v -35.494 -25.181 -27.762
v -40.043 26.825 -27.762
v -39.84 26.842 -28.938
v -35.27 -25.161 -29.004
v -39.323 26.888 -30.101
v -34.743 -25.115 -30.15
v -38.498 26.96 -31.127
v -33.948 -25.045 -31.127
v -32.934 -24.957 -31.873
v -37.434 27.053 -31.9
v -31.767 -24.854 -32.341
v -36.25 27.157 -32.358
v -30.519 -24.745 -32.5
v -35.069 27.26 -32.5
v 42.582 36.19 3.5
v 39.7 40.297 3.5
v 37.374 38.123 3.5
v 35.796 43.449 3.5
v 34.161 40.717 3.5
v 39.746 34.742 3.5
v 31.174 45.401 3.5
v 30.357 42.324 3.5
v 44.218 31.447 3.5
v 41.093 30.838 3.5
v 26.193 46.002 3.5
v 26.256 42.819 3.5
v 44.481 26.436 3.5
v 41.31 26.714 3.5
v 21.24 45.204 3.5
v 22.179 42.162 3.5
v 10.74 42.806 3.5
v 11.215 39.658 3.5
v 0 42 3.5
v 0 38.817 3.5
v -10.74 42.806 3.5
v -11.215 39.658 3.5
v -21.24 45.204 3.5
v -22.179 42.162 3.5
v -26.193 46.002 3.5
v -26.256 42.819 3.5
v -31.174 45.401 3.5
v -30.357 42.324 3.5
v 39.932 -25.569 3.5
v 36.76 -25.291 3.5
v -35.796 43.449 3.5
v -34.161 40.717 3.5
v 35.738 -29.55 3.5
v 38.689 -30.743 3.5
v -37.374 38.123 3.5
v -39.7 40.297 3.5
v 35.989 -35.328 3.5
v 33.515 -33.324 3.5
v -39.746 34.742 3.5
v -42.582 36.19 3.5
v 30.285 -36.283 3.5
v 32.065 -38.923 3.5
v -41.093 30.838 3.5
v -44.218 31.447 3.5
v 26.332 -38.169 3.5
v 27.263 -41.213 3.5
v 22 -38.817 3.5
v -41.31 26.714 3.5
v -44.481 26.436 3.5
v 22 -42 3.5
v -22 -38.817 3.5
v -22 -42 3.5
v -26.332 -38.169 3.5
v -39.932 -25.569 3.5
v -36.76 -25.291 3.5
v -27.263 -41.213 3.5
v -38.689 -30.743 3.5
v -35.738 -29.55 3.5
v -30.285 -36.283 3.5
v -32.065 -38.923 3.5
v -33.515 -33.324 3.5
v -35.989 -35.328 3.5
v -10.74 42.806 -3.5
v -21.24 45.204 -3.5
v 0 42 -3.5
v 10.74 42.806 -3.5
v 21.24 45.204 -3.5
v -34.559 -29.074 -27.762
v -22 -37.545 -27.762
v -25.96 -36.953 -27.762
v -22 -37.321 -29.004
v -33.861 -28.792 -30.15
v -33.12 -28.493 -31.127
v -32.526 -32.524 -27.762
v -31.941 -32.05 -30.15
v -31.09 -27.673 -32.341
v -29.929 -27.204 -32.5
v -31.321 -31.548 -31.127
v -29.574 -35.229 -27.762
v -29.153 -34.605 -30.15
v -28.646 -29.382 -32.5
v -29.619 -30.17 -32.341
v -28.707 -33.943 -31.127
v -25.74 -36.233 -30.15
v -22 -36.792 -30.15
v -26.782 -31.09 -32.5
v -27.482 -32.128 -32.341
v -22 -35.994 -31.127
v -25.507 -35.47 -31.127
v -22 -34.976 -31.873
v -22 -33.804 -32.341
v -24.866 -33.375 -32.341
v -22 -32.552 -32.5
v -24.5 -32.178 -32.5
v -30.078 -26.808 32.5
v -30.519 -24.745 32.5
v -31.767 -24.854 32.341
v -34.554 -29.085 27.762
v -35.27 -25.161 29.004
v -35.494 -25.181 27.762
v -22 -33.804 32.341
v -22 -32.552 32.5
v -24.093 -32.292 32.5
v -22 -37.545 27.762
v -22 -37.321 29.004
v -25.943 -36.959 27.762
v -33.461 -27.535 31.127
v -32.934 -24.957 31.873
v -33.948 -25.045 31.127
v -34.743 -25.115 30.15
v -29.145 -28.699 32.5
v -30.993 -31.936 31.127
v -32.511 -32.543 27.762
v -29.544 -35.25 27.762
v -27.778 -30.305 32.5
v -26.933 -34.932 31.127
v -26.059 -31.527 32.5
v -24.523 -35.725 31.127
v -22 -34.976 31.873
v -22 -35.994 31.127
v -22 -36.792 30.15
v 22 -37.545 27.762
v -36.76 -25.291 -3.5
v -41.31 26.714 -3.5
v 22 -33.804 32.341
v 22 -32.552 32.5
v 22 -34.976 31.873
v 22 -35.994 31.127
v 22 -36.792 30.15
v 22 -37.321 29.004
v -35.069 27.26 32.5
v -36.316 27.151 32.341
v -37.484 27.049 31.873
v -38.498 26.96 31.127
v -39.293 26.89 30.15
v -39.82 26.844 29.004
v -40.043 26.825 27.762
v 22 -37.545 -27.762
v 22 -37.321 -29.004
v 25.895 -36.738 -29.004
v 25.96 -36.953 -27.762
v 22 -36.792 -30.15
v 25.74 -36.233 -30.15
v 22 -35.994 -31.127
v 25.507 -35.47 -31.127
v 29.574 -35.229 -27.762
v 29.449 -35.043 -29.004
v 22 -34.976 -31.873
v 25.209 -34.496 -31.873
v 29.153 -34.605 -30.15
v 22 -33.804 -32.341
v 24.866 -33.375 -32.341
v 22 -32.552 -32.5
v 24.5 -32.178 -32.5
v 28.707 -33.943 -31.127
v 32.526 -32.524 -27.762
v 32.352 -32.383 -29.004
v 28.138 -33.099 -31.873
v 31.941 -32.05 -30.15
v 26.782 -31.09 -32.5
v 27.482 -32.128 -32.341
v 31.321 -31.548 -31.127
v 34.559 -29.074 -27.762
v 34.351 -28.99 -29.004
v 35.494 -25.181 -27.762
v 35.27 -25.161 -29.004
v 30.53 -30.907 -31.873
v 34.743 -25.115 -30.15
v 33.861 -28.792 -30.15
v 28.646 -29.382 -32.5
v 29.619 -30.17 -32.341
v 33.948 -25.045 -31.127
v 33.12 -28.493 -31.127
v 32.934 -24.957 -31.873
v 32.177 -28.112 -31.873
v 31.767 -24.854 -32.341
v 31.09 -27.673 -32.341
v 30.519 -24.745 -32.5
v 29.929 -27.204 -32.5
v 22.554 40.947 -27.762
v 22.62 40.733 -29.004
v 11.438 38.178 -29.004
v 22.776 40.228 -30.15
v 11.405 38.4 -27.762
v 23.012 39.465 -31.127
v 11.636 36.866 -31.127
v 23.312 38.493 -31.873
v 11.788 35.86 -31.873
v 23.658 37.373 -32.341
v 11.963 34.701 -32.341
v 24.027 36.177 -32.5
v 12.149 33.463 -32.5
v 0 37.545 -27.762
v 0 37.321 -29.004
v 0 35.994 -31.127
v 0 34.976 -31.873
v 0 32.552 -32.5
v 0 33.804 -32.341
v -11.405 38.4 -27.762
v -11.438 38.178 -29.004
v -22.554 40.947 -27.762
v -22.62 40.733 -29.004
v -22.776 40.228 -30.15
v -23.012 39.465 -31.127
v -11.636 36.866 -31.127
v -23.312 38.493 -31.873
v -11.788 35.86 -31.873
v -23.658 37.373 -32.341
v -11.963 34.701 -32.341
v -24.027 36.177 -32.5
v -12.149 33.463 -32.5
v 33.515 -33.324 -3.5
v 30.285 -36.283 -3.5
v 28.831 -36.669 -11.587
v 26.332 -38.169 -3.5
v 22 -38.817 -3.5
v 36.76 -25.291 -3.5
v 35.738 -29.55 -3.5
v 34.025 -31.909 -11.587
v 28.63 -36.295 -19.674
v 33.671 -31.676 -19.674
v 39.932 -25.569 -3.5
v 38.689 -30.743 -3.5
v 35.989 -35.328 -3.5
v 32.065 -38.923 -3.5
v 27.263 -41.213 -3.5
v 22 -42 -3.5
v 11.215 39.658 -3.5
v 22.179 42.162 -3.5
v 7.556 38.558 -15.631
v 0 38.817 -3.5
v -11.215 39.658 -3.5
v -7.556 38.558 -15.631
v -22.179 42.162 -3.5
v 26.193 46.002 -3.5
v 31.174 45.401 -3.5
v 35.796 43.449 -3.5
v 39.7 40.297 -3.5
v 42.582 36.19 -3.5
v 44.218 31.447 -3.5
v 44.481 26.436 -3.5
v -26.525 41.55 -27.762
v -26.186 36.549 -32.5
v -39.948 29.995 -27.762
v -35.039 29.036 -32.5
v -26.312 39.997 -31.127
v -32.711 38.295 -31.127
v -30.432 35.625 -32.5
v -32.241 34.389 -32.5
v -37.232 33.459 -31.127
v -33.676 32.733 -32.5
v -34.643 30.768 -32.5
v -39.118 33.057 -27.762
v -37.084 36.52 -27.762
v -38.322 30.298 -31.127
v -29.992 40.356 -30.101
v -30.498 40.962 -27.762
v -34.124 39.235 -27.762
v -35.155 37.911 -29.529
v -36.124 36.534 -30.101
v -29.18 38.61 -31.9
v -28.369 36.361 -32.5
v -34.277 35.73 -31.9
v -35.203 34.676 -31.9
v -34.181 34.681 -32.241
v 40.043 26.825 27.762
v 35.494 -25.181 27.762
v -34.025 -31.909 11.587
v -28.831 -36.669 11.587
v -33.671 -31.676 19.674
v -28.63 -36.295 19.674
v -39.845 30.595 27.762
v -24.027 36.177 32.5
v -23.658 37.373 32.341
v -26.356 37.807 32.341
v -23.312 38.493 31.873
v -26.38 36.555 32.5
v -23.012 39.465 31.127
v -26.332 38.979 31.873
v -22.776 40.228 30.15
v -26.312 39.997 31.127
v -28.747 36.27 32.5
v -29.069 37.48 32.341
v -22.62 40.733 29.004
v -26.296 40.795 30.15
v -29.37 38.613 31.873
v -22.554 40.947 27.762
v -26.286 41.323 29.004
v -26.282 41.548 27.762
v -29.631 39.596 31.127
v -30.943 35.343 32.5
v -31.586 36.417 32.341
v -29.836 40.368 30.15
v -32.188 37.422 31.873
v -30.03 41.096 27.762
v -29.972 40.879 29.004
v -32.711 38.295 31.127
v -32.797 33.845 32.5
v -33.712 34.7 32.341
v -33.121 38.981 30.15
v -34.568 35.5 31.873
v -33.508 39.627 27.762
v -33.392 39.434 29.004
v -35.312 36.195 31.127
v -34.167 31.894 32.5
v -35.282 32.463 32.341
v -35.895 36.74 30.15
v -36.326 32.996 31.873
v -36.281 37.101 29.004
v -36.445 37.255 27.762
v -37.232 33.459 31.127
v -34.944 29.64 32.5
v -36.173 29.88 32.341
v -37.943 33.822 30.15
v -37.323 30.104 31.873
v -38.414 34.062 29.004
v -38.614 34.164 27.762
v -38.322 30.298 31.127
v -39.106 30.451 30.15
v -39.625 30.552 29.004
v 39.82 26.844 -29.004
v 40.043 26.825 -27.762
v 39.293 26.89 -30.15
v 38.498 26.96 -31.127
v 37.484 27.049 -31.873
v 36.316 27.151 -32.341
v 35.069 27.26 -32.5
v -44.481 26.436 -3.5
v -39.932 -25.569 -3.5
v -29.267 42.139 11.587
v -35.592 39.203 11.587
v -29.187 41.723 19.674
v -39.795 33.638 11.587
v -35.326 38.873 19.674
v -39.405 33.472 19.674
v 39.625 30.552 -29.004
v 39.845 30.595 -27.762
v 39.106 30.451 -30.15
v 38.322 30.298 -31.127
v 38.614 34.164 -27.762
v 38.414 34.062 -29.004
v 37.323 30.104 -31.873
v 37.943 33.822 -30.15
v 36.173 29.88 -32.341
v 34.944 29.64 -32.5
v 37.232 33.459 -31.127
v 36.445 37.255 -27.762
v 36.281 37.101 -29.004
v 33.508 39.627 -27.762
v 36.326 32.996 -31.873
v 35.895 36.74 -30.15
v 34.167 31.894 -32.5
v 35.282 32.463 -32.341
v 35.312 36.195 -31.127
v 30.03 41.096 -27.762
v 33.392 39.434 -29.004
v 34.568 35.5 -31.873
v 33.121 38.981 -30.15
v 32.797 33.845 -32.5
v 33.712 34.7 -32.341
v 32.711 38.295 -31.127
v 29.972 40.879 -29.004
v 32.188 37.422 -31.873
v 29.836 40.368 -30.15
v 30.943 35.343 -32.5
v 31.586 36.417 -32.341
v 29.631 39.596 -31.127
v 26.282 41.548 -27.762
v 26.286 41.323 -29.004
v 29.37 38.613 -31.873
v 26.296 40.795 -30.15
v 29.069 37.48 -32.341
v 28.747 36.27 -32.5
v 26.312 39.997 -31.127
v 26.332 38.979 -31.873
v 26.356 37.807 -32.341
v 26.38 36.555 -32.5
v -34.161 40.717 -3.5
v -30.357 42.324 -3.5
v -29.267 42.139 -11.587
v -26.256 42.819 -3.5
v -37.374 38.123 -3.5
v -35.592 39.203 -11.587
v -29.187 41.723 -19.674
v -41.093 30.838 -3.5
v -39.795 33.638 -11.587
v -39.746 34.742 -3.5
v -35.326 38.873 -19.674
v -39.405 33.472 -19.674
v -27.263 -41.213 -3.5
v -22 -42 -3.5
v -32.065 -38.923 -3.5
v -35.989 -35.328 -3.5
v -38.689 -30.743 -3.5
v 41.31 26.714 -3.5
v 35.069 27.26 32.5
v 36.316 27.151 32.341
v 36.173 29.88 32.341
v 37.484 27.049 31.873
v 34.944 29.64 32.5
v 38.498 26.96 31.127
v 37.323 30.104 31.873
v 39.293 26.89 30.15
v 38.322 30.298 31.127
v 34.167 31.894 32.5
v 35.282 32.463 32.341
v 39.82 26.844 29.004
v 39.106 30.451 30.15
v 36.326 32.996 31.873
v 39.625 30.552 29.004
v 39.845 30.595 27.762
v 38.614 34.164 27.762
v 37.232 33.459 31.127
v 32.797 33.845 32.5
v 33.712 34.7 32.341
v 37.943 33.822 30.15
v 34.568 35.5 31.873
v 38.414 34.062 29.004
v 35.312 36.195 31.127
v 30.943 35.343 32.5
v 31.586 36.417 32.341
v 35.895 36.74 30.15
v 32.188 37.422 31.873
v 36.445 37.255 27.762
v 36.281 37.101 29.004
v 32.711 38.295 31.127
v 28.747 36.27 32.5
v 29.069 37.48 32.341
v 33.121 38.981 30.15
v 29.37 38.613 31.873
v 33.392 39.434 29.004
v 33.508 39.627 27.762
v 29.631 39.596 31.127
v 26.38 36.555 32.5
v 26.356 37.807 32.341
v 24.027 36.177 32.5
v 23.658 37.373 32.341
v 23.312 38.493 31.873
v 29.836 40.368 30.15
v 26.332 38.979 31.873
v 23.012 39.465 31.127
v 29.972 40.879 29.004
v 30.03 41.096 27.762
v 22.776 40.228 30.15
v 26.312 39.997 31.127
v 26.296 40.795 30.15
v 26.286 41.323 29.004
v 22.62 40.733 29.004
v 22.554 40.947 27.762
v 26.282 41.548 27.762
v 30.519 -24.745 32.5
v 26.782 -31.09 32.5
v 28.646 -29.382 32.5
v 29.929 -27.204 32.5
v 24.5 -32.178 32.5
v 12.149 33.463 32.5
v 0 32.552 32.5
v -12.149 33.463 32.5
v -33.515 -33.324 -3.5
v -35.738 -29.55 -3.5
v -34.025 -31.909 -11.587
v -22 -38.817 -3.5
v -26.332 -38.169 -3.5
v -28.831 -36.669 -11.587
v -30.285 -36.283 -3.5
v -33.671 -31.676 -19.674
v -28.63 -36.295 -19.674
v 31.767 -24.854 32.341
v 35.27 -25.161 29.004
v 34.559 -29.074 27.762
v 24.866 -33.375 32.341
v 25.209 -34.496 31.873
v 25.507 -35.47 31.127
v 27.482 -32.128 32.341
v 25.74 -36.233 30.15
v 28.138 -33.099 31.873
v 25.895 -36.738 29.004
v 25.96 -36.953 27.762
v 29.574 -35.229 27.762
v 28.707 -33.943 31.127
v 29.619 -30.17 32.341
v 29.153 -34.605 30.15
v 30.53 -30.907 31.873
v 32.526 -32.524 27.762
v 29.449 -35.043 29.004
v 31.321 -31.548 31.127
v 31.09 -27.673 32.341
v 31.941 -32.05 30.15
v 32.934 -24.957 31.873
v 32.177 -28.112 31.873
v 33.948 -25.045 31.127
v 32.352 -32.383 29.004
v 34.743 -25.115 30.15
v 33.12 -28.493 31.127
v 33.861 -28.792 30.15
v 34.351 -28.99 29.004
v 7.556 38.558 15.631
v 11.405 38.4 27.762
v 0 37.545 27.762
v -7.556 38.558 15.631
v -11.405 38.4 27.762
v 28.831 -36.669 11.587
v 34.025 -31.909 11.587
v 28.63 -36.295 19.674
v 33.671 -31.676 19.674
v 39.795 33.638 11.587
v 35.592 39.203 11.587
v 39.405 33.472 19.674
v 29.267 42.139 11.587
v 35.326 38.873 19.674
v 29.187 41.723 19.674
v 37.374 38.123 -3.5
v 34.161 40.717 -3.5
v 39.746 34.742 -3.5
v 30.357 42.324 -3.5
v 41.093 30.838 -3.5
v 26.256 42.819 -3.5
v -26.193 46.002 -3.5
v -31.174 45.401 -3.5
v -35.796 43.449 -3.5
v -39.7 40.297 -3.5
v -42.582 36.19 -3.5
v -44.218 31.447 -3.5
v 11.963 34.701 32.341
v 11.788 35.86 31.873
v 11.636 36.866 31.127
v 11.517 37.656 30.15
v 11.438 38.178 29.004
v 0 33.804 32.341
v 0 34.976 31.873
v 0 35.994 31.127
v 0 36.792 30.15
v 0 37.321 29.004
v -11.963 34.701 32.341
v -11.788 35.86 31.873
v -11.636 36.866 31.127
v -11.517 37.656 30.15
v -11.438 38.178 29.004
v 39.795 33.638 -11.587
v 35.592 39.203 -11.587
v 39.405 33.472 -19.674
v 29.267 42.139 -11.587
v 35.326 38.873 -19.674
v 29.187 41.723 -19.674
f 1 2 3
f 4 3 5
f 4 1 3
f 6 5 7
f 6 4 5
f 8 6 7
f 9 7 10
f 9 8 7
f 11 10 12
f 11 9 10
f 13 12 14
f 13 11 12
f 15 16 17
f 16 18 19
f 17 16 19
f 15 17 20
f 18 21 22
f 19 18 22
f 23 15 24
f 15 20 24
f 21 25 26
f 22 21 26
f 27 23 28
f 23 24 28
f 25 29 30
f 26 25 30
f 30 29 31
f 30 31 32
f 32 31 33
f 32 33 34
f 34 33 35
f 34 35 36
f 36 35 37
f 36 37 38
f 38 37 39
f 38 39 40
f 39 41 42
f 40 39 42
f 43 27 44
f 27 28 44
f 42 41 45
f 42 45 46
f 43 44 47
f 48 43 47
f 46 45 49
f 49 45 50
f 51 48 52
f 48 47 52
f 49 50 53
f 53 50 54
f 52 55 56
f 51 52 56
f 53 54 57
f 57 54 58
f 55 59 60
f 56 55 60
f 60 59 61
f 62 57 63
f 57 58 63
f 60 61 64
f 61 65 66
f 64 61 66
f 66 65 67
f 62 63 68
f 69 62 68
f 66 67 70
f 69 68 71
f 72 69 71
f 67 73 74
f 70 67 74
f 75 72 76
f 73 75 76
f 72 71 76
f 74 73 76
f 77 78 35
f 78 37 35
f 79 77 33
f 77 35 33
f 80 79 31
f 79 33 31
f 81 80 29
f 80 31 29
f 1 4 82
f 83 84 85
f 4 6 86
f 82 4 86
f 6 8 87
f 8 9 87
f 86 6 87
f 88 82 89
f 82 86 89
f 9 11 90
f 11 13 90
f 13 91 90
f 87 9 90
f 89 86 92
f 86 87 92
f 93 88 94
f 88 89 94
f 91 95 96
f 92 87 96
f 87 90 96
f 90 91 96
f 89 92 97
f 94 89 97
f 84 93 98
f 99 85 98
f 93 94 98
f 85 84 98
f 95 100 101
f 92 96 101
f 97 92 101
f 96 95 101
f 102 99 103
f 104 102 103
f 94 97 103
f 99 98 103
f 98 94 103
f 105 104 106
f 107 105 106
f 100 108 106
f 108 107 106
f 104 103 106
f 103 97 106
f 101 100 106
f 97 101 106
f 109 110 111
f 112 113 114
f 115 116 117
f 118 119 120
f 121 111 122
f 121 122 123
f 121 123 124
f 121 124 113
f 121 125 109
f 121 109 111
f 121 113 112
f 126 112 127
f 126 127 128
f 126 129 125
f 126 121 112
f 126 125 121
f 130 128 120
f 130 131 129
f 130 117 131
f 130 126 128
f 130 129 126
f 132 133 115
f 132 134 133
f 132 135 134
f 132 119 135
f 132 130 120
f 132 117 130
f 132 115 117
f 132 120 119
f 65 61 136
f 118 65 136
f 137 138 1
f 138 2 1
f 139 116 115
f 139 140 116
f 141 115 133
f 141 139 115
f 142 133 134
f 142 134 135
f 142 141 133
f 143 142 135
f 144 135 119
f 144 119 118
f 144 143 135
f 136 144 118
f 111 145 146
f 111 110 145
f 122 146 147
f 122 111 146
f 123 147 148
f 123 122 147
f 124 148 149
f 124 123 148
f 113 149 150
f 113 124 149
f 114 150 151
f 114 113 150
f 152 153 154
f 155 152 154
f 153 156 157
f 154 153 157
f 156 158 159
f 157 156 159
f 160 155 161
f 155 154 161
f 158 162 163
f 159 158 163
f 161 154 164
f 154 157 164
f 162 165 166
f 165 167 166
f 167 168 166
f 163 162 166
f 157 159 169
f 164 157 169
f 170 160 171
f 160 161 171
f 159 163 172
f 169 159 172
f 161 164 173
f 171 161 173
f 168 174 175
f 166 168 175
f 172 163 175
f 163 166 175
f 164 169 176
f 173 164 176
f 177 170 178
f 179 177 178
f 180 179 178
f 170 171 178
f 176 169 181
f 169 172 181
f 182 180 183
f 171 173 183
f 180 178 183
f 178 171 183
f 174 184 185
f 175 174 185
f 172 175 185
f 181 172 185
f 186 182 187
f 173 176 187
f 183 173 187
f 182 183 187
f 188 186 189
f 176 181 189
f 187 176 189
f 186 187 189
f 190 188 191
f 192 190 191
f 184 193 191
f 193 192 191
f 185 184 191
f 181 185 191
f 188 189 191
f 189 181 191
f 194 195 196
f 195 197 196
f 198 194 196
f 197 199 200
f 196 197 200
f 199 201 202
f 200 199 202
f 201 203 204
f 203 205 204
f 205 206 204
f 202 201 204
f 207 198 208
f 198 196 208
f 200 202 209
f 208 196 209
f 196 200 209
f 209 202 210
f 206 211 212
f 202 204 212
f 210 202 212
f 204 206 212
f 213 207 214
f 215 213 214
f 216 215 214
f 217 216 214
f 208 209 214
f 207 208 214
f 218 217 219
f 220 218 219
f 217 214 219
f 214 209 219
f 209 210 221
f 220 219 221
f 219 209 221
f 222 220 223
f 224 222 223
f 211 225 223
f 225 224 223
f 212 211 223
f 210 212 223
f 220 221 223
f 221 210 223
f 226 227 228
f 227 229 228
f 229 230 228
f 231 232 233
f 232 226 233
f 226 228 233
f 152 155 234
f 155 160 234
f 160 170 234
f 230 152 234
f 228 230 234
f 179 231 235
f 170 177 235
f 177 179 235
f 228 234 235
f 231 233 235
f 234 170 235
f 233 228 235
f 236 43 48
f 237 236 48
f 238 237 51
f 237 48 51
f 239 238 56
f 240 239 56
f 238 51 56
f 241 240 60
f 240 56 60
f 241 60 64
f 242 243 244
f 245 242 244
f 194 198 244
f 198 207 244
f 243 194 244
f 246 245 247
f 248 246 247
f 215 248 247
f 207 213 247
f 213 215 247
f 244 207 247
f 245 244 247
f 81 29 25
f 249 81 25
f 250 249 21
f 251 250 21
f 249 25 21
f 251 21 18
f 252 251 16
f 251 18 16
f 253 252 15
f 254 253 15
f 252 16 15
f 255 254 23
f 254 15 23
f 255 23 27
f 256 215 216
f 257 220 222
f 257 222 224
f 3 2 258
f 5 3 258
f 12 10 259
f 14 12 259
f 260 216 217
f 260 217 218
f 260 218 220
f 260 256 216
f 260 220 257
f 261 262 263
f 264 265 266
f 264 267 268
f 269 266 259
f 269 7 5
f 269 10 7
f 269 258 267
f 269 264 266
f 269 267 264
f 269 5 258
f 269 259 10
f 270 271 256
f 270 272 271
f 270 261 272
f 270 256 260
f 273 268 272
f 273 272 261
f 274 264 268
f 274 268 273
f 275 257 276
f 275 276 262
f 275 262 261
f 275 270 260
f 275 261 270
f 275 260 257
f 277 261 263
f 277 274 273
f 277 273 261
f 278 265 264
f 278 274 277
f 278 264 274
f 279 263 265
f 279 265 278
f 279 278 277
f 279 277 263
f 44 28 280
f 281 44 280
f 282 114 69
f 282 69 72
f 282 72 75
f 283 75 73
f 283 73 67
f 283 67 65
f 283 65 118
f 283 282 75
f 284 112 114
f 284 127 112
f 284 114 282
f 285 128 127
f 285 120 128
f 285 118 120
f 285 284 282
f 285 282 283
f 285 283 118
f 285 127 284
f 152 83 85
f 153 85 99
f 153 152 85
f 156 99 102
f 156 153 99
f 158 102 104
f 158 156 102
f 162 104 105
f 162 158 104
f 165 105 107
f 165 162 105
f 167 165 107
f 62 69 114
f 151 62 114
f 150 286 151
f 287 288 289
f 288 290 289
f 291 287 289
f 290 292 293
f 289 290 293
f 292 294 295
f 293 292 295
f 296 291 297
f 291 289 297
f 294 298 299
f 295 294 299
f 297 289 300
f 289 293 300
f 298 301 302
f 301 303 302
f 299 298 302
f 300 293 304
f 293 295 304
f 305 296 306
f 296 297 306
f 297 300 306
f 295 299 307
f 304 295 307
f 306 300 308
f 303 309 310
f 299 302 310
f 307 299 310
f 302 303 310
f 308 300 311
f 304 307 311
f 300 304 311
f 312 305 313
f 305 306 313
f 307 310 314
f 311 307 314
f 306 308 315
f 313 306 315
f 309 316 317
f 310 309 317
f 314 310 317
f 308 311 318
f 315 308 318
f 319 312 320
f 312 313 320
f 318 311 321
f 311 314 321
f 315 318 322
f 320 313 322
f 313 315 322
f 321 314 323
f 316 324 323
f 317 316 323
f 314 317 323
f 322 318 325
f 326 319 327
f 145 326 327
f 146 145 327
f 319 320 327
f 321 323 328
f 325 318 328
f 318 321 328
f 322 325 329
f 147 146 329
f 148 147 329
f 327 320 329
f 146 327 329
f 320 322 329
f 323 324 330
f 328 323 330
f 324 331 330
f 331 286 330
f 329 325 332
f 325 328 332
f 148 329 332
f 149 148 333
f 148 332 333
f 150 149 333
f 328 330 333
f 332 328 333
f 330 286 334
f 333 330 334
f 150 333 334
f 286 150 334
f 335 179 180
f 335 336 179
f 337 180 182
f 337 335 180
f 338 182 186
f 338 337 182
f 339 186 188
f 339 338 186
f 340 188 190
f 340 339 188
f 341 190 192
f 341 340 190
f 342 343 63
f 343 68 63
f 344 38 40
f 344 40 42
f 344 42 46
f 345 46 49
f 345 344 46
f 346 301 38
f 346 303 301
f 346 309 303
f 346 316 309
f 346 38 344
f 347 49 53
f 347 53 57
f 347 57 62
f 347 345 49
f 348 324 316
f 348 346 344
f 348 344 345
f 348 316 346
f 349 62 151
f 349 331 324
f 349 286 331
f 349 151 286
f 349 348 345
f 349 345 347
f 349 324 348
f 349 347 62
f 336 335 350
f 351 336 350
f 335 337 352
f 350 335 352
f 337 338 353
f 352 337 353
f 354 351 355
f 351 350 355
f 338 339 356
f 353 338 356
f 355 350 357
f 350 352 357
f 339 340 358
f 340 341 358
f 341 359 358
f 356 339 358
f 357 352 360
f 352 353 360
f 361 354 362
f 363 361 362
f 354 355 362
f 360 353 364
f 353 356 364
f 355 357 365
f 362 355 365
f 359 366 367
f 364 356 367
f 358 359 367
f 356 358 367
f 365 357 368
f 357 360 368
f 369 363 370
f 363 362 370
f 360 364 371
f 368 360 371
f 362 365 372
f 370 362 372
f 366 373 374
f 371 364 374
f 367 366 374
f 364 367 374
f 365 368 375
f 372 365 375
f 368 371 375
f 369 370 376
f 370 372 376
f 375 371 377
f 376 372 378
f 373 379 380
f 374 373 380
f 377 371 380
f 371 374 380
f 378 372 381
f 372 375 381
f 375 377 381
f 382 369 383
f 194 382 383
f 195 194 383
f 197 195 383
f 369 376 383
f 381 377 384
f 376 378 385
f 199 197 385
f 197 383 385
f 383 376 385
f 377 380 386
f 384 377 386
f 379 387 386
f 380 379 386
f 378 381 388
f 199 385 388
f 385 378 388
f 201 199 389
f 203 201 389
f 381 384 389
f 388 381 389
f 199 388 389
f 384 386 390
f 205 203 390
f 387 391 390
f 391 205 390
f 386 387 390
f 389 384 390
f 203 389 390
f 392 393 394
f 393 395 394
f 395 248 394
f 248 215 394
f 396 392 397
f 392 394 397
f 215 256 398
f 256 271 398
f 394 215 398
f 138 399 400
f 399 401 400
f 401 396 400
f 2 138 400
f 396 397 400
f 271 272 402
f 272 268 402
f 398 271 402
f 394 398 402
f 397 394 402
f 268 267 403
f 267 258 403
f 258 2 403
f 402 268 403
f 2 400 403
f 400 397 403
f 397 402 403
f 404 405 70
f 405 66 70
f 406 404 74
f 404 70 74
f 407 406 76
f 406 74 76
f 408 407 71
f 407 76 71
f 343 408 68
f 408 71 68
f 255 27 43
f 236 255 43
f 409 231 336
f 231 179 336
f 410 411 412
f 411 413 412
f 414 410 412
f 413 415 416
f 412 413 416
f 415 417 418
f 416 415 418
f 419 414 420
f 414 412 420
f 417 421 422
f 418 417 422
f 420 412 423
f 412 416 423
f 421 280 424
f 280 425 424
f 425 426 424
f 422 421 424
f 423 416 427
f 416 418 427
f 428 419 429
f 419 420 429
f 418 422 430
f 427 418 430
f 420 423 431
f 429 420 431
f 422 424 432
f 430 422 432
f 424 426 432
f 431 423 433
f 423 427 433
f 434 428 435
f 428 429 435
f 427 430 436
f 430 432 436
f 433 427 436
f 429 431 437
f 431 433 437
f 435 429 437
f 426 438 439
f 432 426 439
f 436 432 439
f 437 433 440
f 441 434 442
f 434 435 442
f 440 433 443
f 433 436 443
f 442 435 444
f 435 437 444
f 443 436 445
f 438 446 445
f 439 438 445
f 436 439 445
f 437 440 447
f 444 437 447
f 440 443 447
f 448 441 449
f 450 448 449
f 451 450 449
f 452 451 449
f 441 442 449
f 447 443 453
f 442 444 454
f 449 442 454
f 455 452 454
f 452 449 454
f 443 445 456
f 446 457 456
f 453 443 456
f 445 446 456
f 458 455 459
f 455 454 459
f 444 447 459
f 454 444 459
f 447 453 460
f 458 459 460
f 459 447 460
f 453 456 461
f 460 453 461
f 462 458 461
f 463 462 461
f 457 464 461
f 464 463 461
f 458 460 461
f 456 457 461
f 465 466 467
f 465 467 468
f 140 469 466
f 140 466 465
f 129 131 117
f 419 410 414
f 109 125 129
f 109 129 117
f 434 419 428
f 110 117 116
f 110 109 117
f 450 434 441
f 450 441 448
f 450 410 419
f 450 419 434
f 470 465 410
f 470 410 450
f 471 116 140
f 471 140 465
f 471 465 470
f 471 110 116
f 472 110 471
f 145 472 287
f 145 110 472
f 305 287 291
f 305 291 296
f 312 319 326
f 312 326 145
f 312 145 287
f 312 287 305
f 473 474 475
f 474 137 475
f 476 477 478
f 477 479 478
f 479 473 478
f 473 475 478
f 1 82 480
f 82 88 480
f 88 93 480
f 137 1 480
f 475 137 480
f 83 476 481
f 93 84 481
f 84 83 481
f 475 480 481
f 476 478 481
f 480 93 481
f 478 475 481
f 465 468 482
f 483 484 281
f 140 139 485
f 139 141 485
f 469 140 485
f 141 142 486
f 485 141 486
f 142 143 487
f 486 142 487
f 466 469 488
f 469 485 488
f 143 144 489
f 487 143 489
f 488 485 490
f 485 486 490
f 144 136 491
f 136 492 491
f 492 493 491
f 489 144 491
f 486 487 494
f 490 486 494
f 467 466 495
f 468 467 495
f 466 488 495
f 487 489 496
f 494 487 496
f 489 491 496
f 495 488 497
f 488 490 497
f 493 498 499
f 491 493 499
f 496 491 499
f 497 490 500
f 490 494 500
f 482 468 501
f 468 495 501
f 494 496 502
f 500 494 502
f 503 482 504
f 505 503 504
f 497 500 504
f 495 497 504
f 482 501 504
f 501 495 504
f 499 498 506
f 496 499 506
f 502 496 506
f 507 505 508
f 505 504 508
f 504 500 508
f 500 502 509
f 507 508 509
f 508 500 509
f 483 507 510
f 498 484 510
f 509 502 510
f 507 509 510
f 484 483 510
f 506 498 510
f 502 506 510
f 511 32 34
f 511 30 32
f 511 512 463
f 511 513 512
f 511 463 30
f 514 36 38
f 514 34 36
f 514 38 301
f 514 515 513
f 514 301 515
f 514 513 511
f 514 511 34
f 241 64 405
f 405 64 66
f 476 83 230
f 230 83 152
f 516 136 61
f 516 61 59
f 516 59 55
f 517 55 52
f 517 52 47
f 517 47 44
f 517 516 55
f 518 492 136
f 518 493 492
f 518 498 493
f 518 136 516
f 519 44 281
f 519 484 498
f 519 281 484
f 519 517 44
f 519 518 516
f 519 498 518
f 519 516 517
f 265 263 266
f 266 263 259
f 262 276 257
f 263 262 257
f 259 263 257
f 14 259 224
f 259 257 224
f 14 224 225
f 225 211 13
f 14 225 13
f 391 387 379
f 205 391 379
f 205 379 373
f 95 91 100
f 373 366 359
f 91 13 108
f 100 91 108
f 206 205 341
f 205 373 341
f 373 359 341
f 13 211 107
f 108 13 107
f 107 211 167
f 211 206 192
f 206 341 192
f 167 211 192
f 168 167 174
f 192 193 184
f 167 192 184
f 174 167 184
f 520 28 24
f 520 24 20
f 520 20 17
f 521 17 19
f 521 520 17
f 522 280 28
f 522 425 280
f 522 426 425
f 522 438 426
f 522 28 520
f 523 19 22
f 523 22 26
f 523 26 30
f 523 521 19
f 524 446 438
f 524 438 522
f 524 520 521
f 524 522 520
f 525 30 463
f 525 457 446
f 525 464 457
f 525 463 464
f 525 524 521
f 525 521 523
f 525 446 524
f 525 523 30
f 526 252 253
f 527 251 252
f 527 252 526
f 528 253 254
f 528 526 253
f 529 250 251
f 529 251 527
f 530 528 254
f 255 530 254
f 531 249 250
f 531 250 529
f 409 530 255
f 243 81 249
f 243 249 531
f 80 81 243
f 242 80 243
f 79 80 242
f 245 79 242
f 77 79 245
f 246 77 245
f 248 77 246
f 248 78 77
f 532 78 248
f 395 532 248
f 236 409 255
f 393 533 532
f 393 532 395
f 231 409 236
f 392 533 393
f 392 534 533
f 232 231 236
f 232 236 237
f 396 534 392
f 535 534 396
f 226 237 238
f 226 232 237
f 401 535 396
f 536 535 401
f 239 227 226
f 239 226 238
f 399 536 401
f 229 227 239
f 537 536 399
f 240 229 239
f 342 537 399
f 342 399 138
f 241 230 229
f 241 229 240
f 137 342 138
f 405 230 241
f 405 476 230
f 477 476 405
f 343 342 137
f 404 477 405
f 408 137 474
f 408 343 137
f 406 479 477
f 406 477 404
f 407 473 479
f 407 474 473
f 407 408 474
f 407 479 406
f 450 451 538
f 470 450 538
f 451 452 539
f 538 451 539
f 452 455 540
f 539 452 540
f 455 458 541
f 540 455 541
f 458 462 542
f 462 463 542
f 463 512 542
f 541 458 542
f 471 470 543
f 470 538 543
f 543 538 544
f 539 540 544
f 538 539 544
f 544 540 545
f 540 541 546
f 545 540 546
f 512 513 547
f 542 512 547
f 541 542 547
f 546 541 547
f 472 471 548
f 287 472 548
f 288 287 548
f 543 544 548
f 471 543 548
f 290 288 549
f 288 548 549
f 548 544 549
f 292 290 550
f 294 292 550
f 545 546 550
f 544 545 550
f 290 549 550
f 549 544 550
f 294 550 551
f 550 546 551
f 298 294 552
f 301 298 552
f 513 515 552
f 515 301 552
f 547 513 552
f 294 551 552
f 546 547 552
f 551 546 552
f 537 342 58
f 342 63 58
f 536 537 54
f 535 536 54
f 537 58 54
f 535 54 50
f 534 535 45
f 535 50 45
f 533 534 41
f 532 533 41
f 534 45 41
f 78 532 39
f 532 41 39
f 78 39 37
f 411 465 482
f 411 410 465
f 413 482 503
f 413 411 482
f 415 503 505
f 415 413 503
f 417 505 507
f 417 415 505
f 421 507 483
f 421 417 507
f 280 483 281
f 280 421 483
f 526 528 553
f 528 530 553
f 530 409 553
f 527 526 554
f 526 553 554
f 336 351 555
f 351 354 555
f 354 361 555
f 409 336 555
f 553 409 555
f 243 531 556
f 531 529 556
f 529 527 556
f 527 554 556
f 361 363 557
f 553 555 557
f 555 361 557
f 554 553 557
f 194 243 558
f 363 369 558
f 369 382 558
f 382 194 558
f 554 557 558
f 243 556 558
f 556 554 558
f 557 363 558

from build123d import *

# Parameters (mm, degrees)
BOSS_EXTRUDE1_DEPTH           = 32.5
BOSS_EXTRUDE1_TAPER           = 3.0000000000000067
BOSS_EXTRUDE1_OTHER_WAY_DEPTH = 32.5
BOSS_EXTRUDE1_OTHER_WAY_TAPER = 3.0000000000000067
FILLET1_R                     = 5
EXTRUDE_THIN1_DEPTH           = 3.5


with BuildPart() as part:
    # Sketch1 → Boss-Extrude1 (new body)
    with BuildSketch(Plane(origin=(0, 0, 0), x_dir=(0, 1, 0), z_dir=(0, 0, 1))):
        with BuildLine():
            ThreePointArc((-39, -22), (-35.05916005215183, -32.13385311423494), (-25.307336141214776, -36.94292047137618))
            Line((-25.307336141214776, -36.94292047137618), (26.697869727868188, -41.49278642925244))
            ThreePointArc((26.697869727868188, -41.49278642925244), (39.67535451570329, -35.97364601503939), (42.33767155756914, -22.124888298230207))
            ThreePointArc((42.33767155756914, -22.124888298230207), (39, 9.18e-15), (42.33767155756914, 22.124888298230207))
            ThreePointArc((42.33767155756914, 22.124888298230207), (39.67535451570329, 35.97364601503939), (26.697869727868188, 41.49278642925244))
            Line((26.697869727868188, 41.49278642925244), (-25.307336141214776, 36.94292047137618))
            ThreePointArc((-25.307336141214776, 36.94292047137618), (-35.059160052151825, 32.13385311423494), (-39, 22))
            Line((-39, 22), (-39, -22))
        make_face()
    extrude(amount=BOSS_EXTRUDE1_DEPTH, taper=BOSS_EXTRUDE1_TAPER)

    # Sketch1 → Boss-Extrude1 other way (add)
    with BuildSketch(Plane(origin=(0, 0, 0), x_dir=(0, 1, 0), z_dir=(0, 0, 1))):
        with BuildLine():
            ThreePointArc((-39, -22), (-35.05916005215183, -32.13385311423494), (-25.307336141214776, -36.94292047137618))
            Line((-25.307336141214776, -36.94292047137618), (26.697869727868188, -41.49278642925244))
            ThreePointArc((26.697869727868188, -41.49278642925244), (39.67535451570329, -35.97364601503939), (42.33767155756914, -22.124888298230207))
            ThreePointArc((42.33767155756914, -22.124888298230207), (39, 9.18e-15), (42.33767155756914, 22.124888298230207))
            ThreePointArc((42.33767155756914, 22.124888298230207), (39.67535451570329, 35.97364601503939), (26.697869727868188, 41.49278642925244))
            Line((26.697869727868188, 41.49278642925244), (-25.307336141214776, 36.94292047137618))
            ThreePointArc((-25.307336141214776, 36.94292047137618), (-35.059160052151825, 32.13385311423494), (-39, 22))
            Line((-39, 22), (-39, -22))
        make_face()
    extrude(amount=-BOSS_EXTRUDE1_OTHER_WAY_DEPTH, taper=BOSS_EXTRUDE1_OTHER_WAY_TAPER)

    # Fillet1
    fillet1_edges = [part.edges().sort_by_distance(p)[0] for p in [
        (30.983152183423496, -33.80339034416901, -32.5),
        (37.52108201484714, 0.8437150585246758, -32.5),
        (34.90357401366931, 38.35020693767984, -32.5),
        (6.661e-14, 37.296747173301156, -32.5),
        (-30.9831521834235, -33.80339034416899, 32.50000000000001),
        (5.09e-15, -37.296747173301156, 32.50000000000001),
        (30.983152183423503, -33.80339034416899, 32.50000000000001),
        (37.521082014847224, 0.8437150585246735, 32.500000000000014),
        (34.9035740136693, 38.35020693767984, 32.50000000000001),
        (-34.903574013669285, 38.35020693767984, -32.5),
        (-8.9e-16, 37.29674717330116, 32.50000000000001),
        (-34.9035740136693, 38.35020693767985, 32.50000000000001),
        (-37.52108201484706, 0.8437150585246949, 32.5),
        (-37.521082014847146, 0.8437150585246864, -32.5),
        (-30.983152183423496, -33.803390344168996, -32.5),
        (1.119e-14, -37.296747173301156, -32.5),
    ]]
    fillet(fillet1_edges, radius=FILLET1_R)

    # Sketch1<2> → Extrude-Thin1 (add, symmetric)
    with BuildSketch(Plane(origin=(0, 0, 0), x_dir=(0, 1, 0), z_dir=(0, 0, 1))):
        with BuildLine():
            Line((-42, -22), (-42, 22))
            ThreePointArc((-42, 21.999999999999996), (-37.270992062582195, 34.160623737081934), (-25.56880336945773, 39.93150456565142))
            Line((-25.56880336945773, 39.93150456565142), (26.436402499625235, 44.48137052352768))
            ThreePointArc((26.436402499625235, 44.48137052352768), (42.009384245027356, 37.858402026472014), (45.20416469526637, 21.239892766301))
            ThreePointArc((45.20416469526637, 21.239892766300997), (42, 8.82e-15), (45.20416469526637, -21.239892766300997))
            ThreePointArc((45.20416469526637, -21.239892766301), (42.009384245027356, -37.858402026472014), (26.436402499625235, -44.48137052352768))
            Line((26.436402499625235, -44.48137052352768), (-25.56880336945773, -39.93150456565142))
            ThreePointArc((-25.568803369457736, -39.931504565651416), (-37.270992062582195, -34.16062373708193), (-42, -22.000000000000004))
        make_face()
        with BuildLine():
            Line((-36, -22), (-36, 22))
            ThreePointArc((-36, 22.000000000000004), (-32.84732804172147, 30.107082491387963), (-25.045868912971823, 33.95433637710095))
            Line((-25.045868912971823, 33.954336377100944), (26.95933695611114, 38.5042023349772))
            ThreePointArc((26.95933695611114, 38.5042023349772), (37.341324786379225, 34.08889000360676), (39.471178419871904, 23.009883830159414))
            ThreePointArc((39.471178419871904, 23.009883830159417), (36, 9.55e-15), (39.471178419871904, -23.009883830159417))
            ThreePointArc((39.471178419871904, -23.009883830159414), (37.341324786379225, -34.08889000360676), (26.95933695611114, -38.5042023349772))
            Line((26.95933695611114, -38.5042023349772), (-25.045868912971823, -33.954336377100944))
            ThreePointArc((-25.045868912971816, -33.95433637710095), (-32.84732804172146, -30.107082491387953), (-36, -21.999999999999996))
        make_face(mode=Mode.SUBTRACT)
    extrude(amount=EXTRUDE_THIN1_DEPTH, both=True)


solid = part.part
